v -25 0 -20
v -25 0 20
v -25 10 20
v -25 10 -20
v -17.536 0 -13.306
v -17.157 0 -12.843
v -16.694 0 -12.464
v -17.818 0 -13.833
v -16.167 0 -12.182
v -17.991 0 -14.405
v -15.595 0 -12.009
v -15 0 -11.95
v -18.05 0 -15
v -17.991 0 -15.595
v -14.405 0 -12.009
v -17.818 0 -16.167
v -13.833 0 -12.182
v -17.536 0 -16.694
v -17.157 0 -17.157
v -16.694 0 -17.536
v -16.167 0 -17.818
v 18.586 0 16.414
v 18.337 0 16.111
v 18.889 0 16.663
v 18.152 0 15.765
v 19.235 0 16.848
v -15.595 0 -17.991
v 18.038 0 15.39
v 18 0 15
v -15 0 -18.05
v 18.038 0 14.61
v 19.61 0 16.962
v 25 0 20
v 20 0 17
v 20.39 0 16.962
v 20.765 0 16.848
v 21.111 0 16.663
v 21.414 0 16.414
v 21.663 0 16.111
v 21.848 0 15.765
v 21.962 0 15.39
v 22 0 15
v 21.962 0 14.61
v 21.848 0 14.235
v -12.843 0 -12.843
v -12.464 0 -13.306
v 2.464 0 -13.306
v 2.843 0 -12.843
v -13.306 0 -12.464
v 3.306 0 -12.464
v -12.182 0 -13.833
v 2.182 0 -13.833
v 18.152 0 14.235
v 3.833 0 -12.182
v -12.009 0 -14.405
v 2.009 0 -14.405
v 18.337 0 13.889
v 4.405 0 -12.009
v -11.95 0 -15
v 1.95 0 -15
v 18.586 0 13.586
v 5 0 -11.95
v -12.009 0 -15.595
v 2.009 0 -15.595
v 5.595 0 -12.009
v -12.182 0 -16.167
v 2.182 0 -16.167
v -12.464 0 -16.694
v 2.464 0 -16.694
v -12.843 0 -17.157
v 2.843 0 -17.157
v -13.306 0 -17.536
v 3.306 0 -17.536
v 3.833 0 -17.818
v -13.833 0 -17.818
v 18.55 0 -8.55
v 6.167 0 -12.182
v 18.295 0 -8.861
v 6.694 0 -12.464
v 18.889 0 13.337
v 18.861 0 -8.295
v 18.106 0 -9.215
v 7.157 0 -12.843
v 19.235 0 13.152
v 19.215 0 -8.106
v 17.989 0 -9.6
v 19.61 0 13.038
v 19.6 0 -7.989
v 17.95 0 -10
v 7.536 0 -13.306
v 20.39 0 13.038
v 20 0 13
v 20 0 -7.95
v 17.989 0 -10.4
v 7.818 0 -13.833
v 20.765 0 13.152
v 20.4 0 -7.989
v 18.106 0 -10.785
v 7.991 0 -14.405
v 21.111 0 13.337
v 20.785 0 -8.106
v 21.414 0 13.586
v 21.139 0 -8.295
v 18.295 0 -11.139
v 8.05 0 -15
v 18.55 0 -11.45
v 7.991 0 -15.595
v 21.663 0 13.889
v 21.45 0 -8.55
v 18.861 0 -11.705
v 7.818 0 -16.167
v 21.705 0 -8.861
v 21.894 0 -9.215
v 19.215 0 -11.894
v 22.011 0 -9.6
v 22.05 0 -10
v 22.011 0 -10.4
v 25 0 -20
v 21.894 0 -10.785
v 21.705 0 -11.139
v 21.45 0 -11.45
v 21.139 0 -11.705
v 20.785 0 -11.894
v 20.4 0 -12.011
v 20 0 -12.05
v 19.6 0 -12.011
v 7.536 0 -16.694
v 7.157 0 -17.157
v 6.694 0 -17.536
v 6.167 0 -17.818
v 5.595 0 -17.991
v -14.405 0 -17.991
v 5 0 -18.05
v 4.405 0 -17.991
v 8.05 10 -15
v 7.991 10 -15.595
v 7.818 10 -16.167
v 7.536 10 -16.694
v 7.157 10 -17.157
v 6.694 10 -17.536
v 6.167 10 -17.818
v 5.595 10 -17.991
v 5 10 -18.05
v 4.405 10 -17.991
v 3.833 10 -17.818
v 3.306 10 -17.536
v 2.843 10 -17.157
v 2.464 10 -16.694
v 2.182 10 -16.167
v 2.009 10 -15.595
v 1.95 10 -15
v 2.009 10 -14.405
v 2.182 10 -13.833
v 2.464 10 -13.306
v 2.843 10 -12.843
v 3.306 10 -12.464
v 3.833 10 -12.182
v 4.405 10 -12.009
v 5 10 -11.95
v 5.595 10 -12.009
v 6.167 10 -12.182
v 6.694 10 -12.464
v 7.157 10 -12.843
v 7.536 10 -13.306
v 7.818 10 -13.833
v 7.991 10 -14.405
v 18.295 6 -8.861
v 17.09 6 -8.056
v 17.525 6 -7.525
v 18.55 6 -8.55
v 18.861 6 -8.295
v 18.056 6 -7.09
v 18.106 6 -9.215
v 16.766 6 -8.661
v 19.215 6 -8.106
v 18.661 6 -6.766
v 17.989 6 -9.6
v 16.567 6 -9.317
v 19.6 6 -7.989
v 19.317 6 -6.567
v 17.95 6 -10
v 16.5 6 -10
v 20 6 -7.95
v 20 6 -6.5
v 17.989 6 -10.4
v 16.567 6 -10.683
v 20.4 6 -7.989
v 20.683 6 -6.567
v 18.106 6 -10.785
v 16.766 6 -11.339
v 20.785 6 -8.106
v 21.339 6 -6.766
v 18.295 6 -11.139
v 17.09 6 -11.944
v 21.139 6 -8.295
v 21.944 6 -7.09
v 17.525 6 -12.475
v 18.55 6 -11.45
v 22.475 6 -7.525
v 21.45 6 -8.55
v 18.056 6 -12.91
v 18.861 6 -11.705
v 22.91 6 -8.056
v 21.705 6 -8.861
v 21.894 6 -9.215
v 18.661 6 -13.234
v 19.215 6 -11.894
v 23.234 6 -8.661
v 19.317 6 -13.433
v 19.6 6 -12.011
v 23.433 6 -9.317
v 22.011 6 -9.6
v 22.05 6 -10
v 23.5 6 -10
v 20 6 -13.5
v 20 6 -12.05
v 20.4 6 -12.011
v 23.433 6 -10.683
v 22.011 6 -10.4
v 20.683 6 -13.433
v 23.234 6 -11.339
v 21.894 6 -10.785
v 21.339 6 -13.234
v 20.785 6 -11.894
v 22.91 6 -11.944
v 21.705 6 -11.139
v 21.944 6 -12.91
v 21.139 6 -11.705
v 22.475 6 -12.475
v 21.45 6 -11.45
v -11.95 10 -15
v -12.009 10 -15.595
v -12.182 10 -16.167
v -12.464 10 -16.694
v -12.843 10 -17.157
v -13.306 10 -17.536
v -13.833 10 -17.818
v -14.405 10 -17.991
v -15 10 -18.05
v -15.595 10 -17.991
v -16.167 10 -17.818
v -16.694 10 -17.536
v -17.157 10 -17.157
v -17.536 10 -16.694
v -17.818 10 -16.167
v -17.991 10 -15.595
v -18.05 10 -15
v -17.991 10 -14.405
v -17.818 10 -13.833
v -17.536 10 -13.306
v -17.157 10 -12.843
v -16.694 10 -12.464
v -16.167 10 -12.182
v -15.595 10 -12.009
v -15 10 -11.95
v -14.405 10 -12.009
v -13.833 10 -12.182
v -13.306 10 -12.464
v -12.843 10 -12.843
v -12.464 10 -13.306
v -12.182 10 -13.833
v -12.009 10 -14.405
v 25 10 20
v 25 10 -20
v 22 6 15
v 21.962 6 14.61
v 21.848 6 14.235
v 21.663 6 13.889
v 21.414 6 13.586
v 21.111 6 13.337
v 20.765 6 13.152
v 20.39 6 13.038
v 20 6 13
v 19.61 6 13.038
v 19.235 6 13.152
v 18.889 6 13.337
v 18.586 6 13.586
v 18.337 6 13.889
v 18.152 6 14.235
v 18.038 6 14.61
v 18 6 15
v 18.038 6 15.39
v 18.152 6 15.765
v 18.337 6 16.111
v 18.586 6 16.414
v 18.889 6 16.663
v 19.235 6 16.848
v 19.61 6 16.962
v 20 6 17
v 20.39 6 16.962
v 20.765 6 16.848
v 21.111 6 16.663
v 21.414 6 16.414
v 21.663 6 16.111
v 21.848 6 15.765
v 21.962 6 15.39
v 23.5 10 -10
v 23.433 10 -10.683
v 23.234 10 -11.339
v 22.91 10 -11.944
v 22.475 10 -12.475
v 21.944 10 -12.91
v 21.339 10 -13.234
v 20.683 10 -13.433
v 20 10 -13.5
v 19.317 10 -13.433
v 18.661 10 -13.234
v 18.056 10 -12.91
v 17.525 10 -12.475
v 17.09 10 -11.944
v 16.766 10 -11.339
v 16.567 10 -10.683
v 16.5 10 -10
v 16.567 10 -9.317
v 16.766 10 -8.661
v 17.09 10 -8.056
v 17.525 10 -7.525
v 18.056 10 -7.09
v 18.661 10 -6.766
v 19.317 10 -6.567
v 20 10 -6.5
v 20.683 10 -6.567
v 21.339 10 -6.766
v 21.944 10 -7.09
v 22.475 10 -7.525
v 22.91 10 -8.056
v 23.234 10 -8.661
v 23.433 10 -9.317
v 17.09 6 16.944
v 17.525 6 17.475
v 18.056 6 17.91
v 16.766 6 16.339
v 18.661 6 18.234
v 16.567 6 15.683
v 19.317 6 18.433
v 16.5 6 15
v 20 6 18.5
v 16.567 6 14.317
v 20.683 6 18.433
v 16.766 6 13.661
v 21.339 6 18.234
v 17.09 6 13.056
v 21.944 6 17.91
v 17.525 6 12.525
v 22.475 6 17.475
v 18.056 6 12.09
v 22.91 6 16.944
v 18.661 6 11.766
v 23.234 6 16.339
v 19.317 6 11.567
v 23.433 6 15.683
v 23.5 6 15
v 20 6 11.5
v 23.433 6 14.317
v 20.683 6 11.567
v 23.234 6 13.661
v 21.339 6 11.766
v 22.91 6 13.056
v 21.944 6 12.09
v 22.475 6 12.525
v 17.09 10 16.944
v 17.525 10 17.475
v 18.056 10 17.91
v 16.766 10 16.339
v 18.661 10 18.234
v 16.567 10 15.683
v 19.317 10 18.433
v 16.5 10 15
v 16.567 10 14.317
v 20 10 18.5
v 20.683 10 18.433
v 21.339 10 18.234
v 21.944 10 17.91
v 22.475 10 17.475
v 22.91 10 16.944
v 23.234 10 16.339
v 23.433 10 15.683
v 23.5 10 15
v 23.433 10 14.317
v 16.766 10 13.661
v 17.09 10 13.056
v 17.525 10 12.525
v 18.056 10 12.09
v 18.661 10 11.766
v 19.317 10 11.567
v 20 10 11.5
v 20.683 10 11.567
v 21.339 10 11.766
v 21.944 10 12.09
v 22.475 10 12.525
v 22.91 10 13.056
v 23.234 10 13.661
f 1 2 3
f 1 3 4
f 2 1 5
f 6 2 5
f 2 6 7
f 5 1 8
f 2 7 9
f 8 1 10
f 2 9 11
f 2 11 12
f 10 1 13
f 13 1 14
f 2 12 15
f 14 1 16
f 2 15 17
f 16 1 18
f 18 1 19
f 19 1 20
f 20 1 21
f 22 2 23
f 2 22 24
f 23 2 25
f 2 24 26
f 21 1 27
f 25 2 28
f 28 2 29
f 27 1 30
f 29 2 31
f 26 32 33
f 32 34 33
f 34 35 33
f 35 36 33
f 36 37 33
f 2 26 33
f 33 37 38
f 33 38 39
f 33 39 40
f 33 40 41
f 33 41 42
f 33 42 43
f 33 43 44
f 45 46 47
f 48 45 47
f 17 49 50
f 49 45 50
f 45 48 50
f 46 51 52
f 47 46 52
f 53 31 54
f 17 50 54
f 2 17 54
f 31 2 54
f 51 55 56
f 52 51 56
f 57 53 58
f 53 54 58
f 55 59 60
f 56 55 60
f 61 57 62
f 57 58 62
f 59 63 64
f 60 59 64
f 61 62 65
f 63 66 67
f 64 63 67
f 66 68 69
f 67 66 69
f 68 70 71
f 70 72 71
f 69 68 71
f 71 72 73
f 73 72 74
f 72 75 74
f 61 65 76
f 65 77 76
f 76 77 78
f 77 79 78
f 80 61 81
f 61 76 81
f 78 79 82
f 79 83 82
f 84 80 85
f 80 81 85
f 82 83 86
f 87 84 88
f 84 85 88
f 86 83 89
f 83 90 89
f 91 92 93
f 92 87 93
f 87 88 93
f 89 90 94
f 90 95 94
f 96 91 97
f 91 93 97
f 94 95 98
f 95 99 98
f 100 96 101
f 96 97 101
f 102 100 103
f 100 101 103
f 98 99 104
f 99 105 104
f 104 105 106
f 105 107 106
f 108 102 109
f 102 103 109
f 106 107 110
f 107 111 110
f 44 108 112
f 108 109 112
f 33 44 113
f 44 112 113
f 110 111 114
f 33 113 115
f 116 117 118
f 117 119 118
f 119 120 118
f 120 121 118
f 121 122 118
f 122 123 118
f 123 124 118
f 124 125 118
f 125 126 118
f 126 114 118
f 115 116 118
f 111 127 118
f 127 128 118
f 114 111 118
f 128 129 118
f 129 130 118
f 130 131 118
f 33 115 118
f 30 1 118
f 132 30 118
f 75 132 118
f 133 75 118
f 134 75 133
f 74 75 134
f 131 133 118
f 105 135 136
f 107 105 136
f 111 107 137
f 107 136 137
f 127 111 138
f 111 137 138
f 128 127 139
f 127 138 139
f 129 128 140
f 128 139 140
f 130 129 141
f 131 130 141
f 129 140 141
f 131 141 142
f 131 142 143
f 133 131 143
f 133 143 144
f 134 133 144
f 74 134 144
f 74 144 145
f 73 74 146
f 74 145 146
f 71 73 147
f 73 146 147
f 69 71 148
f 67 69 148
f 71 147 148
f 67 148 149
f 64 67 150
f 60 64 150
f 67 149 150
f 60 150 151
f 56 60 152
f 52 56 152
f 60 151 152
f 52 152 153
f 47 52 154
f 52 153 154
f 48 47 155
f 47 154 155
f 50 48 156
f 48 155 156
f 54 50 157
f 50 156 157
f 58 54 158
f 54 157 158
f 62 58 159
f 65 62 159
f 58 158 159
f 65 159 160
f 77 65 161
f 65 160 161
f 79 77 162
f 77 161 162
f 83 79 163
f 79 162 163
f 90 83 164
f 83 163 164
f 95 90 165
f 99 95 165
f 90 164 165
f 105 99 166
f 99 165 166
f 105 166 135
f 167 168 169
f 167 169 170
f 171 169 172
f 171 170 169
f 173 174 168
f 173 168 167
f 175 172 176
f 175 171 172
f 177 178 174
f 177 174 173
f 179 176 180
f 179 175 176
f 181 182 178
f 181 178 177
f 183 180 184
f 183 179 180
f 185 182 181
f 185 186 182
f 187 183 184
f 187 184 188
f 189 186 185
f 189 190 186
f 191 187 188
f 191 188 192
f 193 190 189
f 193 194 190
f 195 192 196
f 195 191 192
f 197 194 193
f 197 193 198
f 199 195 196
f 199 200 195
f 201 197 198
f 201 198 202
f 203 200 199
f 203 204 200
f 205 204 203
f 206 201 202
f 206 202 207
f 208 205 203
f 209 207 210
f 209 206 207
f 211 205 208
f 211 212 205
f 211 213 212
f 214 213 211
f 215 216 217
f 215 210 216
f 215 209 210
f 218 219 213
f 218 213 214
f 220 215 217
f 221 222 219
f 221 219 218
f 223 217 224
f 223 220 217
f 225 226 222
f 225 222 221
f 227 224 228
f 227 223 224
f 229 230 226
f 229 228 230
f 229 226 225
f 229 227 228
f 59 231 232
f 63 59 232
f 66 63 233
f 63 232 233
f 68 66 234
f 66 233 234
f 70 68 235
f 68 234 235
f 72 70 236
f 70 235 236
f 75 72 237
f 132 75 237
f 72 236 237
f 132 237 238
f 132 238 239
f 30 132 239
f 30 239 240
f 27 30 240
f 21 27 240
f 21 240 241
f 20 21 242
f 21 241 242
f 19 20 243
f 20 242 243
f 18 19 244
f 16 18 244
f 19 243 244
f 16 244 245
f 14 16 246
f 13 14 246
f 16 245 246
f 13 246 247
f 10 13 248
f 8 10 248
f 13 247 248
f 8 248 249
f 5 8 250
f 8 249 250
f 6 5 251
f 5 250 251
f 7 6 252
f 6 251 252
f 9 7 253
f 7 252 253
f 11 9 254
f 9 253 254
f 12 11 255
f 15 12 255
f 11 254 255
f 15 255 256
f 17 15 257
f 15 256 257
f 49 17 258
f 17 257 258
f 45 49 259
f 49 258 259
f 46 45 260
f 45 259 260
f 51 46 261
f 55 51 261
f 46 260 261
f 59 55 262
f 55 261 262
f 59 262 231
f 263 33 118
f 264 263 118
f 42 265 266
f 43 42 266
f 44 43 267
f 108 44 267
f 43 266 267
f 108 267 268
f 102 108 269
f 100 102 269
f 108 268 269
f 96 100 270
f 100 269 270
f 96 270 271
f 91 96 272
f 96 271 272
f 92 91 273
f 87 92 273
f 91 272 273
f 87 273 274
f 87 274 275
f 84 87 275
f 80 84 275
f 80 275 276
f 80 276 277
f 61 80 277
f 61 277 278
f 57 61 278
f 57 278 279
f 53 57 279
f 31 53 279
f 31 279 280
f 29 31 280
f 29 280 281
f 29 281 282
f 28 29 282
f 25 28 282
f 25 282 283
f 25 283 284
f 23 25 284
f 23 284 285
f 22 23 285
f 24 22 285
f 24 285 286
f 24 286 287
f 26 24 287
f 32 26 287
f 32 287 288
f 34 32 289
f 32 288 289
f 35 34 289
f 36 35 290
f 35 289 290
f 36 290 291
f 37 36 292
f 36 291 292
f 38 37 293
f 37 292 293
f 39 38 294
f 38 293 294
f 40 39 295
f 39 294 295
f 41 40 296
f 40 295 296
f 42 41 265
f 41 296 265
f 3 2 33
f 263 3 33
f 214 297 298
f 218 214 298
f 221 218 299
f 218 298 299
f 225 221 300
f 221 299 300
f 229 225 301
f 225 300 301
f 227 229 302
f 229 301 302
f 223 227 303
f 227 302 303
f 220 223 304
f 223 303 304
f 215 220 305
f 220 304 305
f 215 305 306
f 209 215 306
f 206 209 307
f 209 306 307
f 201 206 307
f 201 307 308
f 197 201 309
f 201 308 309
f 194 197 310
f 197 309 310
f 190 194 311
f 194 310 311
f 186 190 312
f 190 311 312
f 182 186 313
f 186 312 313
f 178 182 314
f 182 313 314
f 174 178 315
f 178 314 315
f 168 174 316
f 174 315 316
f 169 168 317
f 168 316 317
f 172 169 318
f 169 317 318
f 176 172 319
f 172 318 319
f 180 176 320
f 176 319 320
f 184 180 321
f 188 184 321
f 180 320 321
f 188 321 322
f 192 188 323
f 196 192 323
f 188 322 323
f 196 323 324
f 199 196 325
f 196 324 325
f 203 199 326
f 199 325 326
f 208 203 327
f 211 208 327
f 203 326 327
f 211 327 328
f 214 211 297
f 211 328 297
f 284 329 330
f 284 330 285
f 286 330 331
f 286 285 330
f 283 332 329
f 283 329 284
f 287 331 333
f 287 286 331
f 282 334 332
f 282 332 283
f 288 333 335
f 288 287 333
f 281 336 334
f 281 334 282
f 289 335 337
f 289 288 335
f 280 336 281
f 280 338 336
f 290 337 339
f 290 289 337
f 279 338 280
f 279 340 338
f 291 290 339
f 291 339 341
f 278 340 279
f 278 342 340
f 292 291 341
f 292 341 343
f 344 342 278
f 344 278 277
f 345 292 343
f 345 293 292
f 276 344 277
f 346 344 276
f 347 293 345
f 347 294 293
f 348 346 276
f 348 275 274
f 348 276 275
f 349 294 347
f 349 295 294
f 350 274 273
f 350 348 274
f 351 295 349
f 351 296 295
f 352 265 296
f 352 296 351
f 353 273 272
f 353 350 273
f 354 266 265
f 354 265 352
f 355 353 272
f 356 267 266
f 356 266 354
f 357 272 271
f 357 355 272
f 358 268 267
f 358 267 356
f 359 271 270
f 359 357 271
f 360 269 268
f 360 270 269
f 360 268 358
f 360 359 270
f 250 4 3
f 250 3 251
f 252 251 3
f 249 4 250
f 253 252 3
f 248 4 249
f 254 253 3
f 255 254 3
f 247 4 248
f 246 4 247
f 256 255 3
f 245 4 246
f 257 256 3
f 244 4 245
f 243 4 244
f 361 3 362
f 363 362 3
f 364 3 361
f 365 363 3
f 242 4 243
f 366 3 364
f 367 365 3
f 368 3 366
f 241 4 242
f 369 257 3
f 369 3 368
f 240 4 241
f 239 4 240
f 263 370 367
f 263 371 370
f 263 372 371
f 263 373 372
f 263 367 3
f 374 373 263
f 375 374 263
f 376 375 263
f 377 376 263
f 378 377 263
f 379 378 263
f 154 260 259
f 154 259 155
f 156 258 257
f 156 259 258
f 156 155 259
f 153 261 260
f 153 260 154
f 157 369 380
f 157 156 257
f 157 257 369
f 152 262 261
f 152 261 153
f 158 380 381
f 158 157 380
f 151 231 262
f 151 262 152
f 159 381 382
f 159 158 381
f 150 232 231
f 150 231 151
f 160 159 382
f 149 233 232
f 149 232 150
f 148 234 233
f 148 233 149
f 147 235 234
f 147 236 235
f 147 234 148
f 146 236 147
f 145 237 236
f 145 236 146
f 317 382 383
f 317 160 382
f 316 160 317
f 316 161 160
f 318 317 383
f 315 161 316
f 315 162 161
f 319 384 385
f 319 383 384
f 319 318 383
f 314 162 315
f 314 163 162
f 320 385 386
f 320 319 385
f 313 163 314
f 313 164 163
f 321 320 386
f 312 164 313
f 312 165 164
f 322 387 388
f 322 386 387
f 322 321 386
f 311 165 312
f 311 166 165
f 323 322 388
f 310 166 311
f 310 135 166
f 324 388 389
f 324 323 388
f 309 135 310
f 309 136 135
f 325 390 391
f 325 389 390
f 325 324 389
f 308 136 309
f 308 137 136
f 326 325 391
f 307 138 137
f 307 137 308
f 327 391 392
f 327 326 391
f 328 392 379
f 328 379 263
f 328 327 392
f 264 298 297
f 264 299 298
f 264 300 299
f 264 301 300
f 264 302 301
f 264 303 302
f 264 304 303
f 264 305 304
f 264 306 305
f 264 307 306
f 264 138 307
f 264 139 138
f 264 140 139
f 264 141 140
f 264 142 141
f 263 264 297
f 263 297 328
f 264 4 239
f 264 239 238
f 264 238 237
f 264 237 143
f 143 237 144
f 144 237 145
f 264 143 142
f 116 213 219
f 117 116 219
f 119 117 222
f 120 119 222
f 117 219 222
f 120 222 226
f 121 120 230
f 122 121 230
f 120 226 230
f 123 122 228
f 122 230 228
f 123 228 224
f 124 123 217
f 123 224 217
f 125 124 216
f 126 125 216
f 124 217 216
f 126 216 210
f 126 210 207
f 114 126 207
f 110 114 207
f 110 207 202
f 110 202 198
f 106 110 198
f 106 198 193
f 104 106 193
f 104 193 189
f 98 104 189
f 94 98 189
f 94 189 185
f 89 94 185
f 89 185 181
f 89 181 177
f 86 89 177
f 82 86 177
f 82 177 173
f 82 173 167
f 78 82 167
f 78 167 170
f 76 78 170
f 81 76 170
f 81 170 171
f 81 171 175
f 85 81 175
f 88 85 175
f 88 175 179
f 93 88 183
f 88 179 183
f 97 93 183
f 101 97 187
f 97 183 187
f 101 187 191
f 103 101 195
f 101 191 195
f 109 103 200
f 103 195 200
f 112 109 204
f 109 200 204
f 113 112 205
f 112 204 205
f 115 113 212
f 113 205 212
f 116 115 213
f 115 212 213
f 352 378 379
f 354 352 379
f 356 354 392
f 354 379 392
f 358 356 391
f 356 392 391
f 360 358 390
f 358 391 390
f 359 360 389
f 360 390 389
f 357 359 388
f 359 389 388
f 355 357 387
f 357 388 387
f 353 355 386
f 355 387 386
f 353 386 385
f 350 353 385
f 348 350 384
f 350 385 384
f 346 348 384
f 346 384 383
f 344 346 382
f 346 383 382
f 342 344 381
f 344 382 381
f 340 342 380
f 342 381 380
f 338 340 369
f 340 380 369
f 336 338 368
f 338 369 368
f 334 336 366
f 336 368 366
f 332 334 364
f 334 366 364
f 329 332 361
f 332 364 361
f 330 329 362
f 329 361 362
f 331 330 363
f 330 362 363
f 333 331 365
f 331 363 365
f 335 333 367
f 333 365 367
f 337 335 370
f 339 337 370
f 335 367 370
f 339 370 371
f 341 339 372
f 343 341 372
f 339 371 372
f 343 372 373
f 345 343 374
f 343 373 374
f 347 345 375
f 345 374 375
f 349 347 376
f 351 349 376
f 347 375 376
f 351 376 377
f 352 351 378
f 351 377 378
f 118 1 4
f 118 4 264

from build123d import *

# Parameters (mm, degrees)
SKETCH1_W           = 50
SKETCH1_H           = 40
BOSS_EXTRUDE1_DEPTH = 10
SKETCH2_R           = 2.05
CUT_EXTRUDE1_DEPTH  = 10
SKETCH4_R           = 3.05
CUT_EXTRUDE2_DEPTH  = 10
SKETCH5_R           = 2
CUT_EXTRUDE3_DEPTH  = 10
SKETCH6_R           = 3.5
CUT_EXTRUDE4_DEPTH  = 4
SKETCH7_R           = 3.5
CUT_EXTRUDE5_DEPTH  = 4


with BuildPart() as part:
    # Sketch1 → Boss-Extrude1 (new body)
    with BuildSketch(Plane(origin=(0, 0, 0), x_dir=(1, 0, 0), z_dir=(0, 1, 0))):
        Rectangle(SKETCH1_W, SKETCH1_H)
    extrude(amount=BOSS_EXTRUDE1_DEPTH)

    # Sketch2 → Cut-Extrude1 (cut)
    with BuildSketch(Plane(origin=(0, 10, 0), x_dir=(1, 0, 0), z_dir=(0, 1, 0))):
        with Locations((20, 10)):
            Circle(SKETCH2_R)
    extrude(amount=-CUT_EXTRUDE1_DEPTH, mode=Mode.SUBTRACT)

    # Sketch4 → Cut-Extrude2 (cut)
    with BuildSketch(Plane(origin=(0, 10, 0), x_dir=(1, 0, 0), z_dir=(0, 1, 0))):
        with Locations((-15, 15)):
            Circle(SKETCH4_R)
        with Locations((5, 15)):
            Circle(SKETCH4_R)
    extrude(amount=-CUT_EXTRUDE2_DEPTH, mode=Mode.SUBTRACT)

    # Sketch5 → Cut-Extrude3 (cut)
    with BuildSketch(Plane(origin=(0, 10, 0), x_dir=(1, 0, 0), z_dir=(0, 1, 0))):
        with Locations((20, -15)):
            Circle(SKETCH5_R)
    extrude(amount=-CUT_EXTRUDE3_DEPTH, mode=Mode.SUBTRACT)

    # Sketch6 → Cut-Extrude4 (cut)
    with BuildSketch(Plane(origin=(0, 10, 0), x_dir=(1, 0, 0), z_dir=(0, 1, 0))):
        with Locations((20, 10)):
            Circle(SKETCH6_R)
    extrude(amount=-CUT_EXTRUDE4_DEPTH, mode=Mode.SUBTRACT)

    # Sketch7 → Cut-Extrude5 (cut)
    with BuildSketch(Plane(origin=(0, 10, 0), x_dir=(1, 0, 0), z_dir=(0, 1, 0))):
        with Locations((20, -15)):
            Circle(SKETCH7_R)
    extrude(amount=-CUT_EXTRUDE5_DEPTH, mode=Mode.SUBTRACT)


solid = part.part
